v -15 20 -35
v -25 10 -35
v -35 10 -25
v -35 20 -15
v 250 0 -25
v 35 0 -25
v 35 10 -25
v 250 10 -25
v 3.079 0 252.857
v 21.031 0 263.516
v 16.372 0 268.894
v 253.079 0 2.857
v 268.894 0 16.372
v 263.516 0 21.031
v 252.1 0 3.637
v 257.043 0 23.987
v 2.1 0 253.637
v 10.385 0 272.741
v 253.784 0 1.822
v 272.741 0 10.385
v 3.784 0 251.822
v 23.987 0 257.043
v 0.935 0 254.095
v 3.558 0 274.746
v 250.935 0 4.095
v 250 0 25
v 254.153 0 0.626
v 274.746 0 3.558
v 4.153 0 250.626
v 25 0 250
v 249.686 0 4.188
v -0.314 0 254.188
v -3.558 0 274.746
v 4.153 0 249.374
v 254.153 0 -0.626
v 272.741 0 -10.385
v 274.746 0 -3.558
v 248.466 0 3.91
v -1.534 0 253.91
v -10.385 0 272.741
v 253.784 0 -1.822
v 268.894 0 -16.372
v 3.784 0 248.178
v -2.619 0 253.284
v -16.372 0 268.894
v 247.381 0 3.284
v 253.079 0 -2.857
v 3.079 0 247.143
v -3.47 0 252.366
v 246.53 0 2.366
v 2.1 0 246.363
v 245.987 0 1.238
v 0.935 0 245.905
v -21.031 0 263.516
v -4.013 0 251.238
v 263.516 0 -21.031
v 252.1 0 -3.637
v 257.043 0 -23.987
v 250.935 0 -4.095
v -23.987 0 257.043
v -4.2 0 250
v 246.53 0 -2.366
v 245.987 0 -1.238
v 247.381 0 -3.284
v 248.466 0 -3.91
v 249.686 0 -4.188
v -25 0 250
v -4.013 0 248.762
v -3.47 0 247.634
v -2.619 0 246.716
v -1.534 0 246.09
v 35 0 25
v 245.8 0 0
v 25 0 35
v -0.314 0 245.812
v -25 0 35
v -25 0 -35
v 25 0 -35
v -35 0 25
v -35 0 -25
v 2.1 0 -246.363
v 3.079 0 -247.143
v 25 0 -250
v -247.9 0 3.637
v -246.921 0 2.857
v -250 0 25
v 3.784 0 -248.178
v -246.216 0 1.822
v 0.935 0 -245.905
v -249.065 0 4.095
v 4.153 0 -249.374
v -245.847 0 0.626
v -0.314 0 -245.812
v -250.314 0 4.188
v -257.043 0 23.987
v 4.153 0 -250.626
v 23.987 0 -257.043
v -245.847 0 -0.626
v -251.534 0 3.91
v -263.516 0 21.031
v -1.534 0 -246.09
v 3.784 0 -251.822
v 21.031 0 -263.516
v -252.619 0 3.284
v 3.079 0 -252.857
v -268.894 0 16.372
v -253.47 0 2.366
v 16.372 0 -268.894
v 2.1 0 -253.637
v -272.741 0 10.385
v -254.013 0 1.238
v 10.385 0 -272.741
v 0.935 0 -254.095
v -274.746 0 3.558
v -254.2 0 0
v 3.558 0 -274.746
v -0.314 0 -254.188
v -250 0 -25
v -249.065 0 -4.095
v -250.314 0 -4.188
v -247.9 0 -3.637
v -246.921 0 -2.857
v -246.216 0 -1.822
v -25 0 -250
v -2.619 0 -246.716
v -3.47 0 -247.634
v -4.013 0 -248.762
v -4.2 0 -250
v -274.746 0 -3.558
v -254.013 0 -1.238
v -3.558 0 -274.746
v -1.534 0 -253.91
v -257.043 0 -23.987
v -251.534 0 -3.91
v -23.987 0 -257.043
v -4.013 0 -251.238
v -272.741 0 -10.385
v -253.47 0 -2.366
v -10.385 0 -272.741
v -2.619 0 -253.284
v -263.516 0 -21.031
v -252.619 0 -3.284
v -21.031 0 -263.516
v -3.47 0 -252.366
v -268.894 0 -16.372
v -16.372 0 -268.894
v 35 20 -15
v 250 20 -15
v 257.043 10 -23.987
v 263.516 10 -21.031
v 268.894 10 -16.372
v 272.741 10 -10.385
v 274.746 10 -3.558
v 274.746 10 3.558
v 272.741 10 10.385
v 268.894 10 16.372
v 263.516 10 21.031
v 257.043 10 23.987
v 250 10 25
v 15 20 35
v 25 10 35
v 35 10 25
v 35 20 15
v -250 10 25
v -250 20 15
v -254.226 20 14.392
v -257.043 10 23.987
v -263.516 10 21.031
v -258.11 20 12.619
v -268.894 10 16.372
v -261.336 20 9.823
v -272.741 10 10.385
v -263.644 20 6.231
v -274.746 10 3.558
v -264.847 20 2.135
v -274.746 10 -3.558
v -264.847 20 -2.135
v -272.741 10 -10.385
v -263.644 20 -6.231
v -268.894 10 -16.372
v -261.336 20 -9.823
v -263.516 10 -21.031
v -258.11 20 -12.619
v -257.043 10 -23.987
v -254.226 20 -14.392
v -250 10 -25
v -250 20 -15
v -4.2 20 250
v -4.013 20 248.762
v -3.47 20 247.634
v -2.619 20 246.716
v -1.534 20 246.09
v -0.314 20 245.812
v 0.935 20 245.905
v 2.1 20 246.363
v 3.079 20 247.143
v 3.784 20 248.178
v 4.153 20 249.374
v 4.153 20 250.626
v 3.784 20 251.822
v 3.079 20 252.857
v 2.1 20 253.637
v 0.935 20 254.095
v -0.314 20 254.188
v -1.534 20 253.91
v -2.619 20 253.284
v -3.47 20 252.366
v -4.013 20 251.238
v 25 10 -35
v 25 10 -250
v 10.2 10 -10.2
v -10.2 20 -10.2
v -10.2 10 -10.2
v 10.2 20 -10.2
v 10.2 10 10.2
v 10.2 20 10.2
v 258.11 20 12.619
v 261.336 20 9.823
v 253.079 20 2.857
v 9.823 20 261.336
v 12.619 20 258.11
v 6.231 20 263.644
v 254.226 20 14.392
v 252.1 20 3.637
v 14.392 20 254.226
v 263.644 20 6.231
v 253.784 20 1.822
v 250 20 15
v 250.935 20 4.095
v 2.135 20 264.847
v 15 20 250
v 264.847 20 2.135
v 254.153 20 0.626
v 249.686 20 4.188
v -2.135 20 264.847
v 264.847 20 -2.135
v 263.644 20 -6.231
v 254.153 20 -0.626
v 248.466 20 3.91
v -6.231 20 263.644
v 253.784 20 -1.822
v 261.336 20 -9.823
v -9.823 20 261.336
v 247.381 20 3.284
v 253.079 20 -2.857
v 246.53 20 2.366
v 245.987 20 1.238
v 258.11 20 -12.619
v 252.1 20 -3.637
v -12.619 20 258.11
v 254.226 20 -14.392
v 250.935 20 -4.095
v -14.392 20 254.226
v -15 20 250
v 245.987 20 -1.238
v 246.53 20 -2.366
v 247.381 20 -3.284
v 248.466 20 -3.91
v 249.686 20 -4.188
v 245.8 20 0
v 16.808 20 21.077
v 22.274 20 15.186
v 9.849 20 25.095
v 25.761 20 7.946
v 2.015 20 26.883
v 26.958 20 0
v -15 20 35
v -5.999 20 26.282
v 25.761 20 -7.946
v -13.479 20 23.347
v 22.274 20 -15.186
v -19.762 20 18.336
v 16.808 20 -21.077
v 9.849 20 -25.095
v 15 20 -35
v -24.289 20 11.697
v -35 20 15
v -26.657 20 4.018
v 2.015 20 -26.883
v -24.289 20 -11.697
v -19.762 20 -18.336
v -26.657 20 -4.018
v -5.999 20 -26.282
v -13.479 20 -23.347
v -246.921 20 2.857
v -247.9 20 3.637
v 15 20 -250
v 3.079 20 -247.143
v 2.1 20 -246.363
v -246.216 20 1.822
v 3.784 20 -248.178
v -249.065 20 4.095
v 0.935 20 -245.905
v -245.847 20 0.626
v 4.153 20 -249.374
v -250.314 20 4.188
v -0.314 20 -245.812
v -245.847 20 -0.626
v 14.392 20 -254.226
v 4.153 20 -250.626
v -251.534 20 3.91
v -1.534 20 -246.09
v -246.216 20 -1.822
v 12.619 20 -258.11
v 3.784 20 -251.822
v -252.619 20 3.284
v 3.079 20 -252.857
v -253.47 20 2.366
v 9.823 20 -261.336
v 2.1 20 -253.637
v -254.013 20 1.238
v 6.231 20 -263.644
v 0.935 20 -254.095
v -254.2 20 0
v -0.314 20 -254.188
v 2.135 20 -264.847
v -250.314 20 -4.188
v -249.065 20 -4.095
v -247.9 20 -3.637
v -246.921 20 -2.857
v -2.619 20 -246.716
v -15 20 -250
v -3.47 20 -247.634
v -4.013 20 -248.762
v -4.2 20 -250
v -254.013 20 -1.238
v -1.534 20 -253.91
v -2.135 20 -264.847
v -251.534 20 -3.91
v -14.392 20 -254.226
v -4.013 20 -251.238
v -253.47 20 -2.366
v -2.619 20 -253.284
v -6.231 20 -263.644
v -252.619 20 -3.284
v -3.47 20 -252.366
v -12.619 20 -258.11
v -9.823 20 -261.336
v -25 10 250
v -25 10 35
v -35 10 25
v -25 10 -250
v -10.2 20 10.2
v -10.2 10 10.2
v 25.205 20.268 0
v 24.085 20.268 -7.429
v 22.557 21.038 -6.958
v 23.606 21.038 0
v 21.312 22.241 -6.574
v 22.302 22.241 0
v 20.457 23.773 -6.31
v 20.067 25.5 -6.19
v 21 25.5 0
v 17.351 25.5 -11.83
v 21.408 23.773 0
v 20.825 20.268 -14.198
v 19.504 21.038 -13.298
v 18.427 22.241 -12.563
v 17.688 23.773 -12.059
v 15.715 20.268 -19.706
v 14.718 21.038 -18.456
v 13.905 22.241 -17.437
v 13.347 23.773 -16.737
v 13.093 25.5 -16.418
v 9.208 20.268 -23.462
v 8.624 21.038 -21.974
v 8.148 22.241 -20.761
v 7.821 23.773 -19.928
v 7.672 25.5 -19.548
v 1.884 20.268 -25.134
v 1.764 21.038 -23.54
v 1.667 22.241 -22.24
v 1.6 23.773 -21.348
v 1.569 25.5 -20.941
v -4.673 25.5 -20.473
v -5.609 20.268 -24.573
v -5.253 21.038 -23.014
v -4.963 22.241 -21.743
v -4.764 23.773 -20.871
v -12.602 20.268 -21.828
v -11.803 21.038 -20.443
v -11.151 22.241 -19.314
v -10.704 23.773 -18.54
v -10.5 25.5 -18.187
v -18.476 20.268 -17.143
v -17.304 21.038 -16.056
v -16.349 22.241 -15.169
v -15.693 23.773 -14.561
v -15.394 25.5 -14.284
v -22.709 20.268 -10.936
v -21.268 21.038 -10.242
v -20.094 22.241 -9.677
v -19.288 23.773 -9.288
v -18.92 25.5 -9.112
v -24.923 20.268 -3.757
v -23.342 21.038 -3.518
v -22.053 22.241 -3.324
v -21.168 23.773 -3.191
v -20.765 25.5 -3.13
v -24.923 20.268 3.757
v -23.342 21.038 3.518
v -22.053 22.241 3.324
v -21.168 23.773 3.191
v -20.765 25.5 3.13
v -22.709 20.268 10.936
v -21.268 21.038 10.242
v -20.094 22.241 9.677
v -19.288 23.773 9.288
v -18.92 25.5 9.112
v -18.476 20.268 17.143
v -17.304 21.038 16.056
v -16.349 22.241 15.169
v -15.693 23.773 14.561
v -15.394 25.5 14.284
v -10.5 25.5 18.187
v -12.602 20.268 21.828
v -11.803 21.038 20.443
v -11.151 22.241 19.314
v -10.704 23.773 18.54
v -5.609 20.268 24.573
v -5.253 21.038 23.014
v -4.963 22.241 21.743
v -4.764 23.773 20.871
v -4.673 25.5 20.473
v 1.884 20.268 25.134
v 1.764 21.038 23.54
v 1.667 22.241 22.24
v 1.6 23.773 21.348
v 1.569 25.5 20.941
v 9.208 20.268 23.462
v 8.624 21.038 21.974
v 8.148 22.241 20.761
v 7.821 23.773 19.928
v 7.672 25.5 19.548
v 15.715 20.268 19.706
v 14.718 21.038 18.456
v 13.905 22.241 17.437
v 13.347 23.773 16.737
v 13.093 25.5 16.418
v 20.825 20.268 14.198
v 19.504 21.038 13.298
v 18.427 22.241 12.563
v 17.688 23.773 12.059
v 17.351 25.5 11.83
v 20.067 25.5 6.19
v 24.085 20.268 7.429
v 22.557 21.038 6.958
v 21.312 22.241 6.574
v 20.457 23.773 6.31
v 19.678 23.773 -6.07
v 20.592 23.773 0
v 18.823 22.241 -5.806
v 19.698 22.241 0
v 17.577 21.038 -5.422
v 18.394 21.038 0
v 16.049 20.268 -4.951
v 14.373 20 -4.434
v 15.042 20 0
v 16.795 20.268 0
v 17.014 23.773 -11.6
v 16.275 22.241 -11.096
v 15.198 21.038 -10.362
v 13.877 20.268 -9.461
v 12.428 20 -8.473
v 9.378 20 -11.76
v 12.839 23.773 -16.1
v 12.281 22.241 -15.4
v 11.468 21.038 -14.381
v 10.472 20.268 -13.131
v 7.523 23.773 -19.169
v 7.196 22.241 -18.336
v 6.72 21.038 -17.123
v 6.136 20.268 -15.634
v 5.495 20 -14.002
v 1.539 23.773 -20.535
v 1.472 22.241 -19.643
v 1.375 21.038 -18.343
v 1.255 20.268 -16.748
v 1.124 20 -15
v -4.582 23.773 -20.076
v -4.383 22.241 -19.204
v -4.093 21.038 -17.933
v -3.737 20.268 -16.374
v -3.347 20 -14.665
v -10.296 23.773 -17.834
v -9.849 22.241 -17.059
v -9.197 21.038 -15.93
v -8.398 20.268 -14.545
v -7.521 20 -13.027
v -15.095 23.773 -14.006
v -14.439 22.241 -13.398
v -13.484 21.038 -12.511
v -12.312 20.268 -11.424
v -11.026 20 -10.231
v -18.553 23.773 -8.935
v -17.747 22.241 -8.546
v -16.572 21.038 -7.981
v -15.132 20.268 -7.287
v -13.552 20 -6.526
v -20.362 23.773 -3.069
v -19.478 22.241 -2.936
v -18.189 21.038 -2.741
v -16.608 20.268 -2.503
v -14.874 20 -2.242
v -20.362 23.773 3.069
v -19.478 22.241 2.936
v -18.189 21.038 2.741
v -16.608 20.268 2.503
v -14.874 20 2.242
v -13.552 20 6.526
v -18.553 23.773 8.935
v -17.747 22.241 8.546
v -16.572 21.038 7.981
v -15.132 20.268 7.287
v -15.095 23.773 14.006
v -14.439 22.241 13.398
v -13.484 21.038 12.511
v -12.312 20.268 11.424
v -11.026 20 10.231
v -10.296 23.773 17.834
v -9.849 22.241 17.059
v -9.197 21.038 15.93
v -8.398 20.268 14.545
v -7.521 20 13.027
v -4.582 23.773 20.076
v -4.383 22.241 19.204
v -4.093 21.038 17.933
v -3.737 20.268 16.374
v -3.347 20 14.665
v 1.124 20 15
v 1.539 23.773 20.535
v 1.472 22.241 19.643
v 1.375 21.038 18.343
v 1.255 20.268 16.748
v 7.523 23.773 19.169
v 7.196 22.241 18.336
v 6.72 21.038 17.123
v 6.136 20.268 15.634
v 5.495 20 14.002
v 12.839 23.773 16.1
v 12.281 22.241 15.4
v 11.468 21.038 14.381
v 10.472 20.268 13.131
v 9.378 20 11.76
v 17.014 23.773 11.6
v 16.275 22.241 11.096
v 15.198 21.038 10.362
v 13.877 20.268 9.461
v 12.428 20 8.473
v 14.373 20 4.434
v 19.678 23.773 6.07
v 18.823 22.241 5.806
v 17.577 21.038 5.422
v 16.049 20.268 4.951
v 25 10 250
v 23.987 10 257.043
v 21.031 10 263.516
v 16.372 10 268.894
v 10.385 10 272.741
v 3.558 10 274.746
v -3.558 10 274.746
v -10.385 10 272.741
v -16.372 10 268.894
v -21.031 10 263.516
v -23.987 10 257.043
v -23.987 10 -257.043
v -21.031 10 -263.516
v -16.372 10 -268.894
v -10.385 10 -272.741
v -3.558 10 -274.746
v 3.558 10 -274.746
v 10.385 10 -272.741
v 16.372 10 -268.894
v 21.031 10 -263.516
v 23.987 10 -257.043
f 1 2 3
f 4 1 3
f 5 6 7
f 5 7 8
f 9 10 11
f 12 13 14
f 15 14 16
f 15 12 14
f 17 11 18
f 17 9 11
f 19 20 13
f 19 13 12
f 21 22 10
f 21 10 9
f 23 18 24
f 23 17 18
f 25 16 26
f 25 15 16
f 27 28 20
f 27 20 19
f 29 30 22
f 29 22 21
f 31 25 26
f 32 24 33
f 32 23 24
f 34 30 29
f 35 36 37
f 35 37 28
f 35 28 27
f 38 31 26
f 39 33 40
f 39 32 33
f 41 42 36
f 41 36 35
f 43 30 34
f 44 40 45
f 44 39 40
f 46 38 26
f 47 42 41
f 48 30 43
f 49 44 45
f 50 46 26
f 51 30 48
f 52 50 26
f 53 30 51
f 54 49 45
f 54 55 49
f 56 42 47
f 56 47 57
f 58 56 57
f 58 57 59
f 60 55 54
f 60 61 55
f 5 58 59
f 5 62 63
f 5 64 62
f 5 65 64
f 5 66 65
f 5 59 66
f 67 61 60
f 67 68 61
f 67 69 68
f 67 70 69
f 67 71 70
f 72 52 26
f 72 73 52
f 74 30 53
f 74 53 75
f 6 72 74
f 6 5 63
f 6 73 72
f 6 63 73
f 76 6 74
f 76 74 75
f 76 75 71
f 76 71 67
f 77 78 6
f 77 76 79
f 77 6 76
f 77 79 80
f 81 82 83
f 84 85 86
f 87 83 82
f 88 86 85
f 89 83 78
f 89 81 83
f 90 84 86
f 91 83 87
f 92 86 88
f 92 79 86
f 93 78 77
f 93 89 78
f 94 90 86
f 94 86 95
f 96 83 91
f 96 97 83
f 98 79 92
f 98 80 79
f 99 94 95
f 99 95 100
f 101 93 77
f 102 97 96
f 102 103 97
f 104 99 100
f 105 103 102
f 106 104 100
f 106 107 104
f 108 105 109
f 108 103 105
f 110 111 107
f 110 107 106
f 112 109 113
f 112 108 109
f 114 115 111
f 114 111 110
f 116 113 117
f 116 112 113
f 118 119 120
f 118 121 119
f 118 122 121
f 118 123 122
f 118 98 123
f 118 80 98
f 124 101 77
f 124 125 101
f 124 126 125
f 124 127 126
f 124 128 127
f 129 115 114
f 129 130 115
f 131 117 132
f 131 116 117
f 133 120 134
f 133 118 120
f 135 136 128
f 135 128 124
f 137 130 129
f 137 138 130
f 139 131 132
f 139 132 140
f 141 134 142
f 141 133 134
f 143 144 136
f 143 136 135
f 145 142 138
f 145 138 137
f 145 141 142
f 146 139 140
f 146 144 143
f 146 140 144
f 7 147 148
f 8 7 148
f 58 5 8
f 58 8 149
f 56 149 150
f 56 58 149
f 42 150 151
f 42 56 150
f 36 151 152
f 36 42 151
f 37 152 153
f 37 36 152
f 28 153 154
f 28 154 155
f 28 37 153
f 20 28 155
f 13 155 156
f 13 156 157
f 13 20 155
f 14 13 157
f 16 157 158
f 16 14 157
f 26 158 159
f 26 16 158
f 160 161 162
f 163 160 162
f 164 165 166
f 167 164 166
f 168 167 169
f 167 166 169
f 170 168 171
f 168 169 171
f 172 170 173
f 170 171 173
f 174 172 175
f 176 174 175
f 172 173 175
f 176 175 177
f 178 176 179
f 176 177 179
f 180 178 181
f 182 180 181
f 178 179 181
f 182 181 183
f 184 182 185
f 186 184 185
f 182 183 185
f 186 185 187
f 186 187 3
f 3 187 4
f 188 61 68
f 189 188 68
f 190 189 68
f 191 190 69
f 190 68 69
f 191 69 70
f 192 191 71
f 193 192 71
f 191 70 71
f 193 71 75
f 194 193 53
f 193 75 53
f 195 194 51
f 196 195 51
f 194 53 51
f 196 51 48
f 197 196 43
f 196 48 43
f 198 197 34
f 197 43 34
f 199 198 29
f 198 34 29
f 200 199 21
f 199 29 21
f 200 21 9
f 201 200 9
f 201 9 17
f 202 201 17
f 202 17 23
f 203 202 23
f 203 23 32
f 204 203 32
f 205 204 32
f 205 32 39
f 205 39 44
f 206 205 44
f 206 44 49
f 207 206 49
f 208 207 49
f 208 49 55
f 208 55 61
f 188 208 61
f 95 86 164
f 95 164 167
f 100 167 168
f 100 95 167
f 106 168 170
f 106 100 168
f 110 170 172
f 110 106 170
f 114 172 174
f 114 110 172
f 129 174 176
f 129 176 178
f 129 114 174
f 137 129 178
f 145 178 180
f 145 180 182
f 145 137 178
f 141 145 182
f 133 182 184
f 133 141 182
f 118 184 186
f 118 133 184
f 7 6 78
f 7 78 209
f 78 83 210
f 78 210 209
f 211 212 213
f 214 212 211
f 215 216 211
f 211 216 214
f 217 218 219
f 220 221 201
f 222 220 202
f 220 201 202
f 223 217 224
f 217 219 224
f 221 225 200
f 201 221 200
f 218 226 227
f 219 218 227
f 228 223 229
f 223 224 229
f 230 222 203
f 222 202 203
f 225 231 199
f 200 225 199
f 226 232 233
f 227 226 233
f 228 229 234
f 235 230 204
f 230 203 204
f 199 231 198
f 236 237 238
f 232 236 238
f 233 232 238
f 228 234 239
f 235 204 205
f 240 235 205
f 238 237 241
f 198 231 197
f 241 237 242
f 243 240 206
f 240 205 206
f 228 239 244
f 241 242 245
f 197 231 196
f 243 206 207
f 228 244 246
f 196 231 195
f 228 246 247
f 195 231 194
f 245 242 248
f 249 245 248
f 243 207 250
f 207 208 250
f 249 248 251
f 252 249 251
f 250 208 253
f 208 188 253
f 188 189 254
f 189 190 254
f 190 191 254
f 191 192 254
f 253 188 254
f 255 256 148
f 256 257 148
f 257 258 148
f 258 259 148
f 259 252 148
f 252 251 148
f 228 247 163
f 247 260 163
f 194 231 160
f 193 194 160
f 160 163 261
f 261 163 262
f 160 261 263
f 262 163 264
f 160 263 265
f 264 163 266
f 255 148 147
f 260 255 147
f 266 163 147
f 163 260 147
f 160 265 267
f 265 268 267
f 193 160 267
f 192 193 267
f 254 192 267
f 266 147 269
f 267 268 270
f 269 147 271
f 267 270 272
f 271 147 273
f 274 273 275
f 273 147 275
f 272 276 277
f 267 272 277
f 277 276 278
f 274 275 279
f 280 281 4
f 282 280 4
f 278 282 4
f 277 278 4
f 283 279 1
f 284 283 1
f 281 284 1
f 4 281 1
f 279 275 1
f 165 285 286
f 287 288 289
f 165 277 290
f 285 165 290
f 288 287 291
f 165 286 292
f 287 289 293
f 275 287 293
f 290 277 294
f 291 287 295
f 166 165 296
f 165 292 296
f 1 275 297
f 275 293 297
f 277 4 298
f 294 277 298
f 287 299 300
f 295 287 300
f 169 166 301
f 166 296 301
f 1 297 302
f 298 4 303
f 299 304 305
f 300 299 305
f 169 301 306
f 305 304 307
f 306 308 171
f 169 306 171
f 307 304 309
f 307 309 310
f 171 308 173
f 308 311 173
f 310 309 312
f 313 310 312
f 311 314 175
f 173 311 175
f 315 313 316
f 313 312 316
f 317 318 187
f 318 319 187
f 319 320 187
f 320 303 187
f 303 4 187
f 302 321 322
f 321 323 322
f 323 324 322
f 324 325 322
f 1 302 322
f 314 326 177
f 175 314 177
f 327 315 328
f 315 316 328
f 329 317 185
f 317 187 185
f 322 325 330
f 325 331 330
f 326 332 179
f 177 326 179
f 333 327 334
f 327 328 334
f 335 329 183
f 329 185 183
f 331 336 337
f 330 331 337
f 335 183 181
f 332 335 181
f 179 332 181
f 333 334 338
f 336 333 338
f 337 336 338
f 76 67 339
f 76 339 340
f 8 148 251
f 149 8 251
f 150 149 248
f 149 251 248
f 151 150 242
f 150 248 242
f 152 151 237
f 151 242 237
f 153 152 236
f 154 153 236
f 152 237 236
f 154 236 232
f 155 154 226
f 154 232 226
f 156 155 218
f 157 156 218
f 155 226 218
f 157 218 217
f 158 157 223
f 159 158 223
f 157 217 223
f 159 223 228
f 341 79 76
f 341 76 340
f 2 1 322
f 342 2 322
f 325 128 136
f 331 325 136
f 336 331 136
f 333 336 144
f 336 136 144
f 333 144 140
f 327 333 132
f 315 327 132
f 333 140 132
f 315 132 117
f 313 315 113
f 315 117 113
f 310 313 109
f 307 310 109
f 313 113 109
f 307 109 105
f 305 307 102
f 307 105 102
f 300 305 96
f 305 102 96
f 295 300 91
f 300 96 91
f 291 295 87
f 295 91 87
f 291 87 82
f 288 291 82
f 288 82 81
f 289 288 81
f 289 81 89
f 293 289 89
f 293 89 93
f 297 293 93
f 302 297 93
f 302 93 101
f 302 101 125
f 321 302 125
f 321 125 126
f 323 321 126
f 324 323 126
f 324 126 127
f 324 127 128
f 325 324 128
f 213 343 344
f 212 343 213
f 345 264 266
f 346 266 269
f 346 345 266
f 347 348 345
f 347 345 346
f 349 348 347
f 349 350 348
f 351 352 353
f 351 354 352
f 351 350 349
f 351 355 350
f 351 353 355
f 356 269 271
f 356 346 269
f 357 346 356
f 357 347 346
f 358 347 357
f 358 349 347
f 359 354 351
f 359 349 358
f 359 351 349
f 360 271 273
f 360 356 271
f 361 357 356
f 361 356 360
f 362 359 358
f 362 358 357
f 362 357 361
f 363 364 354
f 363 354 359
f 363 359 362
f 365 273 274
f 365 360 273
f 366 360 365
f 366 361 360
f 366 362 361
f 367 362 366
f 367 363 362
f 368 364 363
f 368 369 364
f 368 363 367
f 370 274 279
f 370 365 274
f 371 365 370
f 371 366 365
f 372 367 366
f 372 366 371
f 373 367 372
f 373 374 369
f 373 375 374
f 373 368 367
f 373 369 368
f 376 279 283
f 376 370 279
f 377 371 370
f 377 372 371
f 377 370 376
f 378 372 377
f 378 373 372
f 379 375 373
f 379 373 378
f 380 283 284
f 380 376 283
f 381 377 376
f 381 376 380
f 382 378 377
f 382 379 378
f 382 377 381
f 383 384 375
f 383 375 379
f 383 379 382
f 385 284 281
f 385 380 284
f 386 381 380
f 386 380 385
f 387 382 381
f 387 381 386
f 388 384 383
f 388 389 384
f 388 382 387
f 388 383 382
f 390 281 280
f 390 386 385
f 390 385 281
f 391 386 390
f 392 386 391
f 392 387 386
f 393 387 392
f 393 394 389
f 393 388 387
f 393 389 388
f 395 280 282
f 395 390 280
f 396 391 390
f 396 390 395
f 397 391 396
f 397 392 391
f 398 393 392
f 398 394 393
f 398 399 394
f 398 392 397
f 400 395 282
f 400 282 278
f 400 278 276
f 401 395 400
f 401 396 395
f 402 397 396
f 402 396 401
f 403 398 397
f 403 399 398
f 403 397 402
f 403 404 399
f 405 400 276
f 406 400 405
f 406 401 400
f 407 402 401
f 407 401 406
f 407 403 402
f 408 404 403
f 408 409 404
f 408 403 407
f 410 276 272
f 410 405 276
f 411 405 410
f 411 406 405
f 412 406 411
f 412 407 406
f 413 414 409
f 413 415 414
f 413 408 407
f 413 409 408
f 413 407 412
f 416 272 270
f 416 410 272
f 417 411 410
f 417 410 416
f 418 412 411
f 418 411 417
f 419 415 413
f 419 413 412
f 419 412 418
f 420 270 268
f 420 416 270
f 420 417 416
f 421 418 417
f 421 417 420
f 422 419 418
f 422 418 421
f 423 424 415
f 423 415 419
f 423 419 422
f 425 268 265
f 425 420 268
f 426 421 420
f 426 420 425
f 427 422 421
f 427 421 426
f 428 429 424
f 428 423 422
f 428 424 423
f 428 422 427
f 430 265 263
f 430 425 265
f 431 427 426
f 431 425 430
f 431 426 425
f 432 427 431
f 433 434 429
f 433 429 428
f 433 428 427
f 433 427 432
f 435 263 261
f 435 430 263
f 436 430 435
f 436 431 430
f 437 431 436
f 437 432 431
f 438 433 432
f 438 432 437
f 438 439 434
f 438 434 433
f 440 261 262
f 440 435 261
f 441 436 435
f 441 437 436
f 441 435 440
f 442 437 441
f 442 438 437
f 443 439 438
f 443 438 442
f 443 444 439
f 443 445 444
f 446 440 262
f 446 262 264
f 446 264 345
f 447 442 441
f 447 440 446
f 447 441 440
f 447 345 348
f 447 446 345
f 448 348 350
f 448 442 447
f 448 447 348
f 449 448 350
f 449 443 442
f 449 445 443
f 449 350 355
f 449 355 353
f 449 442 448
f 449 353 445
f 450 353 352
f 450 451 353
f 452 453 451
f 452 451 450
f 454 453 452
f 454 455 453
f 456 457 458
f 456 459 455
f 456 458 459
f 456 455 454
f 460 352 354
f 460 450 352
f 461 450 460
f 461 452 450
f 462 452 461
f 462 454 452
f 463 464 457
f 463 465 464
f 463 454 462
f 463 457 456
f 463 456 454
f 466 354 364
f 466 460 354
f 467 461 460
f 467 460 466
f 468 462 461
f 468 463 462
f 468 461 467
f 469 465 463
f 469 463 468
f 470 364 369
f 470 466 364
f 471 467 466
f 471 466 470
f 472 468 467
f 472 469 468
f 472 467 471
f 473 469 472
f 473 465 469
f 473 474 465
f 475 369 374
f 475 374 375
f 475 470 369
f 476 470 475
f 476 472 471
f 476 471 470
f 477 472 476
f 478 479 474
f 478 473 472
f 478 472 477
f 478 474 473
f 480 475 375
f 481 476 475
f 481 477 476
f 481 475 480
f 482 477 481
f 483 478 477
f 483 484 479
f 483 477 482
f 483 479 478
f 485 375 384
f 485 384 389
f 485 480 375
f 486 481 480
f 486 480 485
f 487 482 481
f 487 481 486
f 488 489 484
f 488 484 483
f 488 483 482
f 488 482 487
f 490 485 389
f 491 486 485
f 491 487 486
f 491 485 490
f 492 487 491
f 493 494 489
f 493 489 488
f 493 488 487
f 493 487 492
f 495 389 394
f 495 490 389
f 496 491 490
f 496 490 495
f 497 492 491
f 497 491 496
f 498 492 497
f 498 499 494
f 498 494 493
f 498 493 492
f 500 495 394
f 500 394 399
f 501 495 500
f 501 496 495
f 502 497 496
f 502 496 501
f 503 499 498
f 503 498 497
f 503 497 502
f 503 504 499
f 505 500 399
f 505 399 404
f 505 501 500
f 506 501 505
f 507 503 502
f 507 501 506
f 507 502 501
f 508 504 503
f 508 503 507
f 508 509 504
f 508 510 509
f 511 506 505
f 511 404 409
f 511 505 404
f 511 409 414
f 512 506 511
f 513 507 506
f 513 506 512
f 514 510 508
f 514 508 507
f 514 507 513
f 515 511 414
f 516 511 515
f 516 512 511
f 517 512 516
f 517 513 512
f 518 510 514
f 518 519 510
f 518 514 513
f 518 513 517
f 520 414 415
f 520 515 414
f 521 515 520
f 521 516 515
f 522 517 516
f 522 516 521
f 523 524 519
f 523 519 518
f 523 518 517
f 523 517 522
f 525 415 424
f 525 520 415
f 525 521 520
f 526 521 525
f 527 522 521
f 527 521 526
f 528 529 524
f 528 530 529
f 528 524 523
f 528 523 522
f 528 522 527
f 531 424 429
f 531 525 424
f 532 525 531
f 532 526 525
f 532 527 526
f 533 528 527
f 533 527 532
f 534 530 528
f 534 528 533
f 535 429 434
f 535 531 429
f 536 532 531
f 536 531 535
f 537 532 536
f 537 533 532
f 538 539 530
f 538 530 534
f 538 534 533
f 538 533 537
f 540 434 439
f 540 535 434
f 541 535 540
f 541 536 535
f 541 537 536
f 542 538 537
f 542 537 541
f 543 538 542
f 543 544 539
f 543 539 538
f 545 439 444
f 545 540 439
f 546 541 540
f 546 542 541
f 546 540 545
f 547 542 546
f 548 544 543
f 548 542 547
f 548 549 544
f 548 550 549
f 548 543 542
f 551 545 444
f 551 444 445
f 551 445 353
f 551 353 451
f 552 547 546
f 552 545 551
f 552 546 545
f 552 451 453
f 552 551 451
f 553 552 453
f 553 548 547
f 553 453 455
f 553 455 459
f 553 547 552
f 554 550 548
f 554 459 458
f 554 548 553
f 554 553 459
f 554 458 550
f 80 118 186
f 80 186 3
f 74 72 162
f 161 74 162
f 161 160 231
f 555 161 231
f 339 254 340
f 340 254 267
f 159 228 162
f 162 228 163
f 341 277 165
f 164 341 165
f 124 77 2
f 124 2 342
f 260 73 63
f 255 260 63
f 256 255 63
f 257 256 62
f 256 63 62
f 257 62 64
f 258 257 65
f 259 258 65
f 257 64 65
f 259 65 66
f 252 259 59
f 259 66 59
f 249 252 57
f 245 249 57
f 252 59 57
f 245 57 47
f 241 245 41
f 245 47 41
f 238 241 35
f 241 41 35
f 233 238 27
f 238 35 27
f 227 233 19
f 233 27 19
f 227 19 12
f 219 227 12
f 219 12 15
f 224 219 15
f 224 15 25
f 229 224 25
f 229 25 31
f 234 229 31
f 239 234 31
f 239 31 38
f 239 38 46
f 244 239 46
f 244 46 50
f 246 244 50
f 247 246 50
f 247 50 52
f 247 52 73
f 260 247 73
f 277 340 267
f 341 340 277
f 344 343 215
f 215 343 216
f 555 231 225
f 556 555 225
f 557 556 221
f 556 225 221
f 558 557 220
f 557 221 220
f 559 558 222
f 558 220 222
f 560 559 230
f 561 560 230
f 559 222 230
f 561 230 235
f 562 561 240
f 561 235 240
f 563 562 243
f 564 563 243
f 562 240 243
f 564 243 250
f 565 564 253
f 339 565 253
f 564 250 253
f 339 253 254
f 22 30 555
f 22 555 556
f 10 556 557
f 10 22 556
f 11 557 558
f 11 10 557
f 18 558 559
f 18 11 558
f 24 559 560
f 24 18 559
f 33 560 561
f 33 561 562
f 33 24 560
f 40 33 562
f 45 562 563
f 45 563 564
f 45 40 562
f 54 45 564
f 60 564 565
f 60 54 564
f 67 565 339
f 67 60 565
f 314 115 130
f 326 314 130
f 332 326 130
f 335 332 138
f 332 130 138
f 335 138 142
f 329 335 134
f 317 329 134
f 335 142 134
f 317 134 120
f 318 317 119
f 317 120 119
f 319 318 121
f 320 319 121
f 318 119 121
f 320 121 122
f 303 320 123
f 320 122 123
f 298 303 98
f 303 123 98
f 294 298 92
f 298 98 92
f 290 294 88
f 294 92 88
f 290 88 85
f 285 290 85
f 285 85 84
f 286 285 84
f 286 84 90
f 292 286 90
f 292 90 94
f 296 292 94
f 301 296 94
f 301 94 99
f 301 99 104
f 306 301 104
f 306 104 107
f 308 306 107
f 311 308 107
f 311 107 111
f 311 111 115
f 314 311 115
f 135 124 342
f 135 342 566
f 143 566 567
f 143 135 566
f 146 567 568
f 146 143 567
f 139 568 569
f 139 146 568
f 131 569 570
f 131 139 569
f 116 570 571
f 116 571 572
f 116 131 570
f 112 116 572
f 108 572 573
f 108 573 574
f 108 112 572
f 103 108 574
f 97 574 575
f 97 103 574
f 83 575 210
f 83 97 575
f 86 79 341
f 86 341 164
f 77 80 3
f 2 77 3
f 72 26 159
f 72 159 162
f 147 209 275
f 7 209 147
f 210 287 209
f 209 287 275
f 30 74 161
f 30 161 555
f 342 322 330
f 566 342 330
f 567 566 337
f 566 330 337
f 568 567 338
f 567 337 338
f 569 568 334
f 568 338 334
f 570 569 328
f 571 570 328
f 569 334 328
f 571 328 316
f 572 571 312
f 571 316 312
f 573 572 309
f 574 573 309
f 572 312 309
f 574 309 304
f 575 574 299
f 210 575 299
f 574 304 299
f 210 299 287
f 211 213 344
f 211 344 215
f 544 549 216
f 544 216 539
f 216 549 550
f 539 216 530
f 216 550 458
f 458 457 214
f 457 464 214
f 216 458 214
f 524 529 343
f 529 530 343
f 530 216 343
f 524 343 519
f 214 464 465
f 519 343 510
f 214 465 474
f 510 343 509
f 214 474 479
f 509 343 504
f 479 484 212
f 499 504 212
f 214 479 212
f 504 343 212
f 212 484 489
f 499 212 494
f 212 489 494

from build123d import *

# Parameters (mm, degrees)
BOSS_EXTRUDE1_DEPTH  = 20
CHAMFER1_SIZE        = 10
M8_CLEARANCE_HOLE1_D = 8.4
SKETCH13_W           = 20.4
SKETCH13_H           = 20.4
CUT_EXTRUDE1_DEPTH   = 10


# Read off the part's stored shape, not the designer's step: Revolve1
with BuildPart() as part:
    # Sketch1 → Boss-Extrude1 (new body)
    with BuildSketch(Plane(origin=(0, 0, 0), x_dir=(1, 0, 0), z_dir=(0, 1, 0))):
        with BuildLine():
            Line((25, 250), (25, -250))
            ThreePointArc((25, -250), (0, -275), (-25, -250))
            Line((-25, -250), (-25, 250))
            ThreePointArc((-25, 250), (0, 275), (25, 250))
        make_face()
        with BuildLine():
            Line((-250, 25), (250, 25))
            ThreePointArc((250, 25), (275, 0), (250, -25))
            Line((250, -25), (-250, -25))
            ThreePointArc((-250, -25), (-275, 0), (-250, 25))
        make_face()
    extrude(amount=BOSS_EXTRUDE1_DEPTH)

    # Chamfer1
    chamfer1_edges = [part.edges().sort_by_distance(p)[0] for p in [
        (275, 20, 0),
        (137.5, 20, 25),
        (137.5, 20, -25),
        (-137.5, 20, -25),
        (25, 10, -25),
        (-25, 10, -25),
        (25, 10, 25),
        (-25, 10, 25),
        (25, 20, -137.5),
        (25, 20, 137.5),
        (0, 20, 275),
        (-25, 20, -137.5),
        (-25, 20, 137.5),
        (0, 20, -275),
        (-275, 20, 0),
        (-137.5, 20, 25),
    ]]
    chamfer(chamfer1_edges, length=CHAMFER1_SIZE)

    # M8 Clearance Hole1 (through all)
    with Locations(Plane(origin=(0, 20, 0), x_dir=(1, 0, 0), z_dir=(0, 1, 0))):
        with Locations((-250, 0), (0, 250), (250, 0), (0, -250)):
            Hole(M8_CLEARANCE_HOLE1_D / 2)

    # Sketch13 → Cut-Extrude1 (cut)
    with BuildSketch(Plane(origin=(0, 20, 0), x_dir=(1, 0, 0), z_dir=(0, 1, 0))):
        Rectangle(SKETCH13_W, SKETCH13_H)
    extrude(amount=-CUT_EXTRUDE1_DEPTH, mode=Mode.SUBTRACT)

    # Revolve1 outline → Revolve1 (revolve)
    with BuildSketch(Plane.XY):
        with BuildLine():
            ThreePointArc((26.958266811, 20), (22.909428257, 21.591165693), (21, 25.5))
            ThreePointArc((21, 25.5), (19.090571743, 21.591165693), (15.041733189, 20))
            Line((15.041733189, 20), (26.958266811, 20))
        make_face()
    revolve(axis=Axis((0, 0, 0), (0, 1, 0)))


solid = part.part
